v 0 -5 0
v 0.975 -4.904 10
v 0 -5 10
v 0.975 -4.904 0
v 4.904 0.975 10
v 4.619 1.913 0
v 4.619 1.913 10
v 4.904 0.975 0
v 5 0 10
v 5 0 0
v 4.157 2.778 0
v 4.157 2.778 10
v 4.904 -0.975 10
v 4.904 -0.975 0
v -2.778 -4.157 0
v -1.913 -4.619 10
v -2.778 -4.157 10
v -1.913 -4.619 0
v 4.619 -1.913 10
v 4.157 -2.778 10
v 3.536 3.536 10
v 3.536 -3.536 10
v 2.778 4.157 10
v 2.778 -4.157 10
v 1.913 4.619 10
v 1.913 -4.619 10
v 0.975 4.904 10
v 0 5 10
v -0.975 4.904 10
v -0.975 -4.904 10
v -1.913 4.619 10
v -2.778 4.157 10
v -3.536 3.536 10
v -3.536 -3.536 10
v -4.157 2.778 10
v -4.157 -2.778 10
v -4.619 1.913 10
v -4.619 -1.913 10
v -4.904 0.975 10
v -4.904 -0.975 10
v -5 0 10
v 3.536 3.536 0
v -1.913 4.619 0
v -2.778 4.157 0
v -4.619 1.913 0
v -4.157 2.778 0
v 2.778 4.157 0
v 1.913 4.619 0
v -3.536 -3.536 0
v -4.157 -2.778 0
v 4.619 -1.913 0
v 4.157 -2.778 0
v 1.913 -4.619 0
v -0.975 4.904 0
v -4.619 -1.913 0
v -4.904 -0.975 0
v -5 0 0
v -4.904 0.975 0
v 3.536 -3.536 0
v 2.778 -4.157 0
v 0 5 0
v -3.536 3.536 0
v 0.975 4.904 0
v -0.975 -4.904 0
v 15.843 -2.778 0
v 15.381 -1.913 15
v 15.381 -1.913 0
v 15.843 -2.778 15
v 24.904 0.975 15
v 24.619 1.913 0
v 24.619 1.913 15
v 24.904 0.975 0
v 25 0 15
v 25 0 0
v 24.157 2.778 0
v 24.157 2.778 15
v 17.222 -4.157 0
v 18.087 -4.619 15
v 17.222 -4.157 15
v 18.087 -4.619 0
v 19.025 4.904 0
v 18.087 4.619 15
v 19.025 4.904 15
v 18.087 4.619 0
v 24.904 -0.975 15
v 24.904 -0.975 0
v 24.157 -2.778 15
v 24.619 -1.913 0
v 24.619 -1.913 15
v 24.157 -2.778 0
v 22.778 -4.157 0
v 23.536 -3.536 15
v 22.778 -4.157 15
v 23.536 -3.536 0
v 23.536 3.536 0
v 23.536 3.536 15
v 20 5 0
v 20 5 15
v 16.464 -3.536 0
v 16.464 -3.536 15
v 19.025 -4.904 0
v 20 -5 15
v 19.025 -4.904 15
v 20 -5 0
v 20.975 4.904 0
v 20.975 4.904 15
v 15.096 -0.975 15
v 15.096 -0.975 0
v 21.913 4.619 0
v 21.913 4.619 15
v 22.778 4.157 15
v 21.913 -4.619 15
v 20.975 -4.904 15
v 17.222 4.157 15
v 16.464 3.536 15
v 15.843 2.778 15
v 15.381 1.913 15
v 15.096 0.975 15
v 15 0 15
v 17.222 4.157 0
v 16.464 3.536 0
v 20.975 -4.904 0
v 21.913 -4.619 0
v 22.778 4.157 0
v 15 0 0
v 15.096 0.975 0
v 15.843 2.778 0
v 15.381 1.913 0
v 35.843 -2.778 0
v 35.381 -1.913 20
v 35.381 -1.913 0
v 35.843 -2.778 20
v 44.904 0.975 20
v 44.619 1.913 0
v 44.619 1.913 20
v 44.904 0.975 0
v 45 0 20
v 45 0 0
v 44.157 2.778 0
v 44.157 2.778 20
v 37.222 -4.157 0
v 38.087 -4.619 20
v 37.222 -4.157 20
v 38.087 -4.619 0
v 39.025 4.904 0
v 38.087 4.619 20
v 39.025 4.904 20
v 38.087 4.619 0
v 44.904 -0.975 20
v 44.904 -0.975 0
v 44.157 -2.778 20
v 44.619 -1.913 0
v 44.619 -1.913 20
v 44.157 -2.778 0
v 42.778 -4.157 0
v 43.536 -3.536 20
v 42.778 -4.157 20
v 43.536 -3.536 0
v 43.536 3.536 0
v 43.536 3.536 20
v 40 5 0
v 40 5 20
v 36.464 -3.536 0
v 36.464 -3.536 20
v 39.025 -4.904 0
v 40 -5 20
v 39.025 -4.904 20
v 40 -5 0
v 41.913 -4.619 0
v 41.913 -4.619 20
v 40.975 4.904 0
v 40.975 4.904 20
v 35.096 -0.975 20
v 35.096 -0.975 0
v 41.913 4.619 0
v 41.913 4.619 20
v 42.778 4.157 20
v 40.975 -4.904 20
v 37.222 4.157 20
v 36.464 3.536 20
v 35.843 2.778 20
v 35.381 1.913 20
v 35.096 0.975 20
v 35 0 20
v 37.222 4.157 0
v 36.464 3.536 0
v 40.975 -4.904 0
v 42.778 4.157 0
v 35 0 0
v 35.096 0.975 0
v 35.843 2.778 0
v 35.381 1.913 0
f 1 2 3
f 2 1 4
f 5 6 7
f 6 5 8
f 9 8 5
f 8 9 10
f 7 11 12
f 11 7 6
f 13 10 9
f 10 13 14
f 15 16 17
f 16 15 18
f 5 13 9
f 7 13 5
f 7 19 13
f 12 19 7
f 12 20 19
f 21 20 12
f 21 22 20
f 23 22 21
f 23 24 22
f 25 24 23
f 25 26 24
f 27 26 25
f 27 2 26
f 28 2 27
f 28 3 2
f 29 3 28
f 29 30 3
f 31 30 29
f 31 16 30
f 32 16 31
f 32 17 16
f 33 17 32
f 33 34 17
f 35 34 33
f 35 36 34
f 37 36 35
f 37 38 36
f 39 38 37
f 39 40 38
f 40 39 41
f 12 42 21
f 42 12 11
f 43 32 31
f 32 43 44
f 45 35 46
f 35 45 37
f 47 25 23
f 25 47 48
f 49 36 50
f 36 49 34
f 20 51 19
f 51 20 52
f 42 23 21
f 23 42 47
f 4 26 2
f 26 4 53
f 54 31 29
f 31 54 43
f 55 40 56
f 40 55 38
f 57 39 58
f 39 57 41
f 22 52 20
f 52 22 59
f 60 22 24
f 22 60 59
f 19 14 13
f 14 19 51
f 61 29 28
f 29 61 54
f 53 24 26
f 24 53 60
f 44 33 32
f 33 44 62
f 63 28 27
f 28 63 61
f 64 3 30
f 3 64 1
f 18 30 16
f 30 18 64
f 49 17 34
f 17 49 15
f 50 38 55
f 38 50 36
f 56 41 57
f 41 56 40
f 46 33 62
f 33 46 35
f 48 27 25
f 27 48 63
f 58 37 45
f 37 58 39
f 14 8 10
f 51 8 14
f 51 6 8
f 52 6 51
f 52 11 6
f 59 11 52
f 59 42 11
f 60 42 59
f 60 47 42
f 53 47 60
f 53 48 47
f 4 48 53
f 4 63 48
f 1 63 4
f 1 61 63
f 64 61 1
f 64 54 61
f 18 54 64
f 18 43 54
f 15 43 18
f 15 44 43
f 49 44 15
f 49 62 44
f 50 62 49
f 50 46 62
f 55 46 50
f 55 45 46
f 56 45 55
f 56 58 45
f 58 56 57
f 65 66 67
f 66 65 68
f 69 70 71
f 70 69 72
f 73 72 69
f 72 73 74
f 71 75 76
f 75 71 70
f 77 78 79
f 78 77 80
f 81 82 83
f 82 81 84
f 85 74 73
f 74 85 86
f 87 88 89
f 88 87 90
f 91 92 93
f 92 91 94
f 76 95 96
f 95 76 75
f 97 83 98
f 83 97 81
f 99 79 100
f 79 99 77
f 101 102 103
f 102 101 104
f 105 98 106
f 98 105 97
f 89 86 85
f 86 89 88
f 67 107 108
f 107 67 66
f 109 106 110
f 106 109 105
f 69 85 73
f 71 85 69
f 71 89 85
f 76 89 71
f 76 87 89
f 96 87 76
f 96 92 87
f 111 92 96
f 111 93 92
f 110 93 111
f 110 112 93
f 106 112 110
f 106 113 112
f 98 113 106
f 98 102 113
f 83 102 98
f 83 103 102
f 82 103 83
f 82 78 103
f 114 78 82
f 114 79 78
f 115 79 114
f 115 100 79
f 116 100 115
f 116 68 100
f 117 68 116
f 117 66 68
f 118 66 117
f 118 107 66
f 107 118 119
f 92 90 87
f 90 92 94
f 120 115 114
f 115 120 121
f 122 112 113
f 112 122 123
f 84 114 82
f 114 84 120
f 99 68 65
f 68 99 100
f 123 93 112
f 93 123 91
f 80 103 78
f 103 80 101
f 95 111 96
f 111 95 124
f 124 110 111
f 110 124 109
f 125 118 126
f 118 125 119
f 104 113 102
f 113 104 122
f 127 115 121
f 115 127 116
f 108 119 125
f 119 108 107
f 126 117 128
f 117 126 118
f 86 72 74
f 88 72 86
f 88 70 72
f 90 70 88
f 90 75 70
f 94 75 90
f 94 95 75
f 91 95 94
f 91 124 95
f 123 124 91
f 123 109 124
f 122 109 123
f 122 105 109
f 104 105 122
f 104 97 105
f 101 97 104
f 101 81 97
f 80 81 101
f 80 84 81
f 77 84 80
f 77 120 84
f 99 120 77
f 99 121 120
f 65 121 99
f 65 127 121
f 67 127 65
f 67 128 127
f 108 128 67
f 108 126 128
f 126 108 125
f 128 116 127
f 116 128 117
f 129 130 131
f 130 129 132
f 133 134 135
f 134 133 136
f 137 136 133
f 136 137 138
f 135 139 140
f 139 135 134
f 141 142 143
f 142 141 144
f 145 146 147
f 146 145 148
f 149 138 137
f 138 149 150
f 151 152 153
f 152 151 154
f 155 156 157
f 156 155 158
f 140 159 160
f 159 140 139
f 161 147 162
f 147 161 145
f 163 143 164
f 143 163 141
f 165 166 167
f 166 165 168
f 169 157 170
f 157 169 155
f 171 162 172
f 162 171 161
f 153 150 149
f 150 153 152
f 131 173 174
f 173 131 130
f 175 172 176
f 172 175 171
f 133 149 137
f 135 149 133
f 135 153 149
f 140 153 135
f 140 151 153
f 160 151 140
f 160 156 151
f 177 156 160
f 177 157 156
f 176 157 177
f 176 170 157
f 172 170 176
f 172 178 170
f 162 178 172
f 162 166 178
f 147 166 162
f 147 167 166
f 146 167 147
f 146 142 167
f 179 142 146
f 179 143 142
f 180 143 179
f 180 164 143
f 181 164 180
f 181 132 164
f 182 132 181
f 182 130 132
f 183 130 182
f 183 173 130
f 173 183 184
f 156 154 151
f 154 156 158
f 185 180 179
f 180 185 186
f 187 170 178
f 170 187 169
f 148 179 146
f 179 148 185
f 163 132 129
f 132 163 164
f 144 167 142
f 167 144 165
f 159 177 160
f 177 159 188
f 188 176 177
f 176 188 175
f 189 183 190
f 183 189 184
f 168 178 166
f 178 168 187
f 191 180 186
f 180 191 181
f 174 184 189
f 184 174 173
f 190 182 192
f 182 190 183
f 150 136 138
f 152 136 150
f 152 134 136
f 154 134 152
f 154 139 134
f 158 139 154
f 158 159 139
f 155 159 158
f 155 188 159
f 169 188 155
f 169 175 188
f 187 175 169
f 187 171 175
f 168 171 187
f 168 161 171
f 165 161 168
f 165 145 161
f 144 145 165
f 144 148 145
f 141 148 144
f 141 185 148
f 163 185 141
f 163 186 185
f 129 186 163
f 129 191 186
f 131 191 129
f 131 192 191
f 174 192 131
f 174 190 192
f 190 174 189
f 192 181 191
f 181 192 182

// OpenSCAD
// A row of posts; override the width with -D width=30
width = 20;
module post(h) { cylinder(h = h, d = width / 2, $fn = 32); }
for (i = [0 : 2]) translate([i * width, 0, 0]) post(10 + 5 * i);
